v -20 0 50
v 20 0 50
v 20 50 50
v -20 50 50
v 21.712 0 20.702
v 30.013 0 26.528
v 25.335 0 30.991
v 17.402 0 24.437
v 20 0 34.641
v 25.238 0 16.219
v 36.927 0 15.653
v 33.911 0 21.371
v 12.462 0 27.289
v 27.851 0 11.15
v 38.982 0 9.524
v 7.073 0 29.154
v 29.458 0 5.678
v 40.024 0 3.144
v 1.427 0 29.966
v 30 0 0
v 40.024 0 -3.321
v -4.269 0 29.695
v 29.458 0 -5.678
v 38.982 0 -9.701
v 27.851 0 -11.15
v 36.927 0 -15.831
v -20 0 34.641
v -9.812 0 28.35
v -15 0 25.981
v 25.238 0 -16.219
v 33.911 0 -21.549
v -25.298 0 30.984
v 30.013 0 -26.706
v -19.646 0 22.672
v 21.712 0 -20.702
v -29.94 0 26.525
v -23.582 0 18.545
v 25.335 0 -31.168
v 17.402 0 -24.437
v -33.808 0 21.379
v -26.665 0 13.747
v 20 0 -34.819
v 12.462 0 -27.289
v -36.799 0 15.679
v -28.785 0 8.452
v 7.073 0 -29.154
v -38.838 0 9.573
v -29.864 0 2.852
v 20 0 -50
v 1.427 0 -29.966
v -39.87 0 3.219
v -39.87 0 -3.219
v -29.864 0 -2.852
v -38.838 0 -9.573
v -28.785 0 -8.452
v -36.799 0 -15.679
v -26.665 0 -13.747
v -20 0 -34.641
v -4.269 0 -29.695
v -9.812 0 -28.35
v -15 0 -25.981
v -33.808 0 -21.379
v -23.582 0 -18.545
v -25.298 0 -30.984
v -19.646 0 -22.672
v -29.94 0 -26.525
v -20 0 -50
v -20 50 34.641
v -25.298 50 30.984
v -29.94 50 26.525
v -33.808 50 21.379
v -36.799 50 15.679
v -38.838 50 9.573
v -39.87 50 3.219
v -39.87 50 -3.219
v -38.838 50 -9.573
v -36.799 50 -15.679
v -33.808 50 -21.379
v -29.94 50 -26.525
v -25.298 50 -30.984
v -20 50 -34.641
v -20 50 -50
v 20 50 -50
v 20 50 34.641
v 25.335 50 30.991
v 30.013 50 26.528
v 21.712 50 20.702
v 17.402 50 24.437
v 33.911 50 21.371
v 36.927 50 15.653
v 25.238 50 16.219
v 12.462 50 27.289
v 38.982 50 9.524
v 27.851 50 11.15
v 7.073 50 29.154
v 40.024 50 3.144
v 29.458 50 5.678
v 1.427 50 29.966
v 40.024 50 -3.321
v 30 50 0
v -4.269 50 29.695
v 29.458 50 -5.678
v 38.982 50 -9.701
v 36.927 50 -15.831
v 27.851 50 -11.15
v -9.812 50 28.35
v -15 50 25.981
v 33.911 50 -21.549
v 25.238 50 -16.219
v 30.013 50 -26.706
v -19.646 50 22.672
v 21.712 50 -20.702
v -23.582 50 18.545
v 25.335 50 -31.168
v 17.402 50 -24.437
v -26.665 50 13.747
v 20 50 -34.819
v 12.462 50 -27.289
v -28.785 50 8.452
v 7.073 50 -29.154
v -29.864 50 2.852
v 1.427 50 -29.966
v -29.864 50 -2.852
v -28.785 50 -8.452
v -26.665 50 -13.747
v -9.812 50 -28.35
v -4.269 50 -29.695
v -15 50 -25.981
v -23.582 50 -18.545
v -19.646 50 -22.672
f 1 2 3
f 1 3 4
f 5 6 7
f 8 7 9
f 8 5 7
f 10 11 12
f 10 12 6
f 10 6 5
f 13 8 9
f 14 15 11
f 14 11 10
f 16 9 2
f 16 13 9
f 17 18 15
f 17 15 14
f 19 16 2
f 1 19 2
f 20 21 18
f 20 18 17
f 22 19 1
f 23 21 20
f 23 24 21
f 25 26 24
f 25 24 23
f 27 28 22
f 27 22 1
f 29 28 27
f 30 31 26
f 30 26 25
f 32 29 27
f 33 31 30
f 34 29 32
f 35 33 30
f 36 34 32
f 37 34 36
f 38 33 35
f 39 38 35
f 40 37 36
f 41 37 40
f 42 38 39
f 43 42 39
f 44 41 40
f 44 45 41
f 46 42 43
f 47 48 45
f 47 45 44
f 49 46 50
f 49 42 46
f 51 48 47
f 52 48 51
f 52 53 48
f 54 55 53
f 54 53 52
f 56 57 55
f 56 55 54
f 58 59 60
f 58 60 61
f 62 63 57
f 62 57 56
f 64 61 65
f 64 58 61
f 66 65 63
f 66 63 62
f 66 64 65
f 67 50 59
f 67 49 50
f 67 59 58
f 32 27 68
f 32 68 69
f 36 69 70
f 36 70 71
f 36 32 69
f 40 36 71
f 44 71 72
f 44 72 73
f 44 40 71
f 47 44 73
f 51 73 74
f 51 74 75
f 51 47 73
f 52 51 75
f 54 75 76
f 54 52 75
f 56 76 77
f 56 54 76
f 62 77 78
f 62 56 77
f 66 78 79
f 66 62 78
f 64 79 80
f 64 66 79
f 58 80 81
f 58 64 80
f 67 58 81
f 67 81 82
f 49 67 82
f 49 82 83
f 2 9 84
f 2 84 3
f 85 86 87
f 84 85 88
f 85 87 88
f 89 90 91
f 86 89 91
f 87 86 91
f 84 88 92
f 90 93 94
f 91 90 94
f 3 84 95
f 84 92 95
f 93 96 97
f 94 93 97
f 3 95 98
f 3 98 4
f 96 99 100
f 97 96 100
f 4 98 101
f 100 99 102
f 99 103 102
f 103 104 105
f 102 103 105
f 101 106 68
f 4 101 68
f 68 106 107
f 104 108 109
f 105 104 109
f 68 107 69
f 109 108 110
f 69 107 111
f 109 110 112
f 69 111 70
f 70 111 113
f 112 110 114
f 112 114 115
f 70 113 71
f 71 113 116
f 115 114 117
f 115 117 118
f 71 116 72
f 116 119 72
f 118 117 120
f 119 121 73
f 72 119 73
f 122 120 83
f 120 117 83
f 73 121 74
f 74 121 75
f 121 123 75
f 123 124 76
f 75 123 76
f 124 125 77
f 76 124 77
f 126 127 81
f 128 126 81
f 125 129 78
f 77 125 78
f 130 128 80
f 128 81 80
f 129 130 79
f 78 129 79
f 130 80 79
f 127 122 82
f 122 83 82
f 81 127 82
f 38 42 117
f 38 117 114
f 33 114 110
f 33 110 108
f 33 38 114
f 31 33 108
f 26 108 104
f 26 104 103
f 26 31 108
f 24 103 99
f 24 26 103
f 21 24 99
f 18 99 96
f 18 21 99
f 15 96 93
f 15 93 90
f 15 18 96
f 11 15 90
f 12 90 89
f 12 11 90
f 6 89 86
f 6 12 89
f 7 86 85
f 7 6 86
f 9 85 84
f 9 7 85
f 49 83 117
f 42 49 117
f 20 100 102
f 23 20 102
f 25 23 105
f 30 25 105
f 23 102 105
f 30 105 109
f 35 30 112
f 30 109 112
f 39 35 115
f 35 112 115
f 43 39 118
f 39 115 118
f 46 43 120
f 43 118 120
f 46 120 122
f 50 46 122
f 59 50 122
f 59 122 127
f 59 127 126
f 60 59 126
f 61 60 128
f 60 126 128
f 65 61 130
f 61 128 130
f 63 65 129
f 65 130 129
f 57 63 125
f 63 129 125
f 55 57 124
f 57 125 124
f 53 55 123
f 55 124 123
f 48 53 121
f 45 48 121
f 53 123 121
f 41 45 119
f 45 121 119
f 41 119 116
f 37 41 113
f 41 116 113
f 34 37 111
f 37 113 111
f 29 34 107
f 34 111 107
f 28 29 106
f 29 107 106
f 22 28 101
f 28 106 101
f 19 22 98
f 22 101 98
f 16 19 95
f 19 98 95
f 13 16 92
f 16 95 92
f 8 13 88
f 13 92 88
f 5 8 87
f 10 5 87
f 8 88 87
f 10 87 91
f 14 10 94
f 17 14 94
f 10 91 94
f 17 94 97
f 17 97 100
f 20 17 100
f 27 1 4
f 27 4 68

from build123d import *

# Parameters (mm, degrees)
BOSS_EXTRUDE1_DEPTH = 50
SKETCH2_R           = 30
CUT_EXTRUDE1_DEPTH  = 50


with BuildPart() as part:
    # Sketch1 → Boss-Extrude1 (new body)
    with BuildSketch(Plane(origin=(0, 0, 0), x_dir=(1, 0, 0), z_dir=(0, 1, 0))):
        with BuildLine():
            Line((-20, 50), (20, 50))
            Line((20, 50), (20, 34.818623064))
            ThreePointArc((20, 34.818623064), (40.154606831, 0.088803456), (20, -34.641016151))
            Line((20, -34.641016151), (20, -50))
            Line((20, -50), (-20, -50))
            Line((-20, -50), (-20, -34.641016151))
            ThreePointArc((-20, -34.641016151), (-40, 0), (-20, 34.641016151))
            Line((-20, 34.641016151), (-20, 50))
        make_face()
    extrude(amount=BOSS_EXTRUDE1_DEPTH)

    # Sketch2 → Cut-Extrude1 (cut)
    with BuildSketch(Plane(origin=(0, 50, 0), x_dir=(1, 0, 0), z_dir=(0, 1, 0))):
        Circle(SKETCH2_R)
    extrude(amount=-CUT_EXTRUDE1_DEPTH, mode=Mode.SUBTRACT)


solid = part.part
